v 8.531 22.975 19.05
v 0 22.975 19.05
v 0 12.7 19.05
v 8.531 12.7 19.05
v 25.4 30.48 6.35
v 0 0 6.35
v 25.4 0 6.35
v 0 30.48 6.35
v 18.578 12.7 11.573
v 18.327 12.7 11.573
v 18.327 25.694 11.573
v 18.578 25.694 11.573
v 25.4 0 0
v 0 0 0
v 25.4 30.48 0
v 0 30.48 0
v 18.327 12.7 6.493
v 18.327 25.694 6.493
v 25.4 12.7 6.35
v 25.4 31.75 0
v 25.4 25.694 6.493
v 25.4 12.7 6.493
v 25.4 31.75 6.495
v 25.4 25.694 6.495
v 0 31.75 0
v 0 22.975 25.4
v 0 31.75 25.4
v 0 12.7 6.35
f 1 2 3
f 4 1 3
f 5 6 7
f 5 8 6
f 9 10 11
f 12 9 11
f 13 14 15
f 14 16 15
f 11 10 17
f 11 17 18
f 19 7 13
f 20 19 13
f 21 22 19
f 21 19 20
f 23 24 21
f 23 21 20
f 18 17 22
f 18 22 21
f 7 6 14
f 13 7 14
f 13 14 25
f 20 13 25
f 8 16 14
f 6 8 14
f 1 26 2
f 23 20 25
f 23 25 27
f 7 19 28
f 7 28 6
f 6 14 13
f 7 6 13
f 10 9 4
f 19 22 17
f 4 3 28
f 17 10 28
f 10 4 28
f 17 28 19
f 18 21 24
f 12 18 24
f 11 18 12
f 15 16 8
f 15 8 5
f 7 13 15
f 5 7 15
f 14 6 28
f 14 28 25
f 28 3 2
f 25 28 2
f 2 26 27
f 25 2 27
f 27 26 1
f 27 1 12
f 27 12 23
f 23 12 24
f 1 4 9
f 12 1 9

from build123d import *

# Parameters (mm, degrees)
F1_W     = 12.7
F1_H     = 6.35
F2_DEPTH = 25.4
F4_DEPTH = 31.75
F5_W     = 25.4
F5_H     = 12.6501958672
F5_H_2   = 9.9607838403
F5_H_3   = 7.8690202925
F6_DEPTH = 6.35
F8_START = 18.32693
F7_W     = 13.6079691021
F7_H     = 5.08
F8_DEPTH = 7.07307


with BuildPart() as f2:
    # F1 (on Right) → F2 (new body)
    with BuildSketch(Plane.YZ):
        Polygon((0, 6.35), (0, 0), (31.75, 0), (31.75, 6.35), (25.4, 6.35), (12.7, 6.35), align=None)
        Polygon((25.4, 6.35), (31.75, 6.35), (31.75, 25.4), (22.9751792536, 25.4), (22.9751792536, 19.05), (12.7, 19.05), (12.7, 12.7), (25.4, 12.7), align=None)
        with Locations((19.05, 9.525)):
            Rectangle(F1_W, F1_H)
    extrude(amount=F2_DEPTH)

    # F3 (on Front) → F4 (cut)
    with BuildSketch(Plane.XZ):
        Polygon((25.4, 25.4), (0, 25.4), (25.4, 6.4947228604), align=None)
    extrude(amount=-F4_DEPTH, mode=Mode.SUBTRACT)

    # F7 (on Right) → F8 (cut)
    with BuildSketch(Plane.YZ.offset(F8_START)):
        with Locations((18.8903899699, 9.0326967025)):
            Rectangle(F7_W, F7_H)
    extrude(amount=F8_DEPTH, mode=Mode.SUBTRACT)


with BuildPart() as f6:
    # F5 (on Top) → F6 (new body)
    with BuildSketch(Plane.XY):
        with Locations((12.7, 6.3250979336)):
            Rectangle(F5_W, F5_H)
        with Locations((12.7, 17.6305877873)):
            Rectangle(F5_W, F5_H_2)
        with Locations((12.7, 26.5454898537)):
            Rectangle(F5_W, F5_H_3)
    extrude(amount=F6_DEPTH)


solid = Compound([f2.part, f6.part])
